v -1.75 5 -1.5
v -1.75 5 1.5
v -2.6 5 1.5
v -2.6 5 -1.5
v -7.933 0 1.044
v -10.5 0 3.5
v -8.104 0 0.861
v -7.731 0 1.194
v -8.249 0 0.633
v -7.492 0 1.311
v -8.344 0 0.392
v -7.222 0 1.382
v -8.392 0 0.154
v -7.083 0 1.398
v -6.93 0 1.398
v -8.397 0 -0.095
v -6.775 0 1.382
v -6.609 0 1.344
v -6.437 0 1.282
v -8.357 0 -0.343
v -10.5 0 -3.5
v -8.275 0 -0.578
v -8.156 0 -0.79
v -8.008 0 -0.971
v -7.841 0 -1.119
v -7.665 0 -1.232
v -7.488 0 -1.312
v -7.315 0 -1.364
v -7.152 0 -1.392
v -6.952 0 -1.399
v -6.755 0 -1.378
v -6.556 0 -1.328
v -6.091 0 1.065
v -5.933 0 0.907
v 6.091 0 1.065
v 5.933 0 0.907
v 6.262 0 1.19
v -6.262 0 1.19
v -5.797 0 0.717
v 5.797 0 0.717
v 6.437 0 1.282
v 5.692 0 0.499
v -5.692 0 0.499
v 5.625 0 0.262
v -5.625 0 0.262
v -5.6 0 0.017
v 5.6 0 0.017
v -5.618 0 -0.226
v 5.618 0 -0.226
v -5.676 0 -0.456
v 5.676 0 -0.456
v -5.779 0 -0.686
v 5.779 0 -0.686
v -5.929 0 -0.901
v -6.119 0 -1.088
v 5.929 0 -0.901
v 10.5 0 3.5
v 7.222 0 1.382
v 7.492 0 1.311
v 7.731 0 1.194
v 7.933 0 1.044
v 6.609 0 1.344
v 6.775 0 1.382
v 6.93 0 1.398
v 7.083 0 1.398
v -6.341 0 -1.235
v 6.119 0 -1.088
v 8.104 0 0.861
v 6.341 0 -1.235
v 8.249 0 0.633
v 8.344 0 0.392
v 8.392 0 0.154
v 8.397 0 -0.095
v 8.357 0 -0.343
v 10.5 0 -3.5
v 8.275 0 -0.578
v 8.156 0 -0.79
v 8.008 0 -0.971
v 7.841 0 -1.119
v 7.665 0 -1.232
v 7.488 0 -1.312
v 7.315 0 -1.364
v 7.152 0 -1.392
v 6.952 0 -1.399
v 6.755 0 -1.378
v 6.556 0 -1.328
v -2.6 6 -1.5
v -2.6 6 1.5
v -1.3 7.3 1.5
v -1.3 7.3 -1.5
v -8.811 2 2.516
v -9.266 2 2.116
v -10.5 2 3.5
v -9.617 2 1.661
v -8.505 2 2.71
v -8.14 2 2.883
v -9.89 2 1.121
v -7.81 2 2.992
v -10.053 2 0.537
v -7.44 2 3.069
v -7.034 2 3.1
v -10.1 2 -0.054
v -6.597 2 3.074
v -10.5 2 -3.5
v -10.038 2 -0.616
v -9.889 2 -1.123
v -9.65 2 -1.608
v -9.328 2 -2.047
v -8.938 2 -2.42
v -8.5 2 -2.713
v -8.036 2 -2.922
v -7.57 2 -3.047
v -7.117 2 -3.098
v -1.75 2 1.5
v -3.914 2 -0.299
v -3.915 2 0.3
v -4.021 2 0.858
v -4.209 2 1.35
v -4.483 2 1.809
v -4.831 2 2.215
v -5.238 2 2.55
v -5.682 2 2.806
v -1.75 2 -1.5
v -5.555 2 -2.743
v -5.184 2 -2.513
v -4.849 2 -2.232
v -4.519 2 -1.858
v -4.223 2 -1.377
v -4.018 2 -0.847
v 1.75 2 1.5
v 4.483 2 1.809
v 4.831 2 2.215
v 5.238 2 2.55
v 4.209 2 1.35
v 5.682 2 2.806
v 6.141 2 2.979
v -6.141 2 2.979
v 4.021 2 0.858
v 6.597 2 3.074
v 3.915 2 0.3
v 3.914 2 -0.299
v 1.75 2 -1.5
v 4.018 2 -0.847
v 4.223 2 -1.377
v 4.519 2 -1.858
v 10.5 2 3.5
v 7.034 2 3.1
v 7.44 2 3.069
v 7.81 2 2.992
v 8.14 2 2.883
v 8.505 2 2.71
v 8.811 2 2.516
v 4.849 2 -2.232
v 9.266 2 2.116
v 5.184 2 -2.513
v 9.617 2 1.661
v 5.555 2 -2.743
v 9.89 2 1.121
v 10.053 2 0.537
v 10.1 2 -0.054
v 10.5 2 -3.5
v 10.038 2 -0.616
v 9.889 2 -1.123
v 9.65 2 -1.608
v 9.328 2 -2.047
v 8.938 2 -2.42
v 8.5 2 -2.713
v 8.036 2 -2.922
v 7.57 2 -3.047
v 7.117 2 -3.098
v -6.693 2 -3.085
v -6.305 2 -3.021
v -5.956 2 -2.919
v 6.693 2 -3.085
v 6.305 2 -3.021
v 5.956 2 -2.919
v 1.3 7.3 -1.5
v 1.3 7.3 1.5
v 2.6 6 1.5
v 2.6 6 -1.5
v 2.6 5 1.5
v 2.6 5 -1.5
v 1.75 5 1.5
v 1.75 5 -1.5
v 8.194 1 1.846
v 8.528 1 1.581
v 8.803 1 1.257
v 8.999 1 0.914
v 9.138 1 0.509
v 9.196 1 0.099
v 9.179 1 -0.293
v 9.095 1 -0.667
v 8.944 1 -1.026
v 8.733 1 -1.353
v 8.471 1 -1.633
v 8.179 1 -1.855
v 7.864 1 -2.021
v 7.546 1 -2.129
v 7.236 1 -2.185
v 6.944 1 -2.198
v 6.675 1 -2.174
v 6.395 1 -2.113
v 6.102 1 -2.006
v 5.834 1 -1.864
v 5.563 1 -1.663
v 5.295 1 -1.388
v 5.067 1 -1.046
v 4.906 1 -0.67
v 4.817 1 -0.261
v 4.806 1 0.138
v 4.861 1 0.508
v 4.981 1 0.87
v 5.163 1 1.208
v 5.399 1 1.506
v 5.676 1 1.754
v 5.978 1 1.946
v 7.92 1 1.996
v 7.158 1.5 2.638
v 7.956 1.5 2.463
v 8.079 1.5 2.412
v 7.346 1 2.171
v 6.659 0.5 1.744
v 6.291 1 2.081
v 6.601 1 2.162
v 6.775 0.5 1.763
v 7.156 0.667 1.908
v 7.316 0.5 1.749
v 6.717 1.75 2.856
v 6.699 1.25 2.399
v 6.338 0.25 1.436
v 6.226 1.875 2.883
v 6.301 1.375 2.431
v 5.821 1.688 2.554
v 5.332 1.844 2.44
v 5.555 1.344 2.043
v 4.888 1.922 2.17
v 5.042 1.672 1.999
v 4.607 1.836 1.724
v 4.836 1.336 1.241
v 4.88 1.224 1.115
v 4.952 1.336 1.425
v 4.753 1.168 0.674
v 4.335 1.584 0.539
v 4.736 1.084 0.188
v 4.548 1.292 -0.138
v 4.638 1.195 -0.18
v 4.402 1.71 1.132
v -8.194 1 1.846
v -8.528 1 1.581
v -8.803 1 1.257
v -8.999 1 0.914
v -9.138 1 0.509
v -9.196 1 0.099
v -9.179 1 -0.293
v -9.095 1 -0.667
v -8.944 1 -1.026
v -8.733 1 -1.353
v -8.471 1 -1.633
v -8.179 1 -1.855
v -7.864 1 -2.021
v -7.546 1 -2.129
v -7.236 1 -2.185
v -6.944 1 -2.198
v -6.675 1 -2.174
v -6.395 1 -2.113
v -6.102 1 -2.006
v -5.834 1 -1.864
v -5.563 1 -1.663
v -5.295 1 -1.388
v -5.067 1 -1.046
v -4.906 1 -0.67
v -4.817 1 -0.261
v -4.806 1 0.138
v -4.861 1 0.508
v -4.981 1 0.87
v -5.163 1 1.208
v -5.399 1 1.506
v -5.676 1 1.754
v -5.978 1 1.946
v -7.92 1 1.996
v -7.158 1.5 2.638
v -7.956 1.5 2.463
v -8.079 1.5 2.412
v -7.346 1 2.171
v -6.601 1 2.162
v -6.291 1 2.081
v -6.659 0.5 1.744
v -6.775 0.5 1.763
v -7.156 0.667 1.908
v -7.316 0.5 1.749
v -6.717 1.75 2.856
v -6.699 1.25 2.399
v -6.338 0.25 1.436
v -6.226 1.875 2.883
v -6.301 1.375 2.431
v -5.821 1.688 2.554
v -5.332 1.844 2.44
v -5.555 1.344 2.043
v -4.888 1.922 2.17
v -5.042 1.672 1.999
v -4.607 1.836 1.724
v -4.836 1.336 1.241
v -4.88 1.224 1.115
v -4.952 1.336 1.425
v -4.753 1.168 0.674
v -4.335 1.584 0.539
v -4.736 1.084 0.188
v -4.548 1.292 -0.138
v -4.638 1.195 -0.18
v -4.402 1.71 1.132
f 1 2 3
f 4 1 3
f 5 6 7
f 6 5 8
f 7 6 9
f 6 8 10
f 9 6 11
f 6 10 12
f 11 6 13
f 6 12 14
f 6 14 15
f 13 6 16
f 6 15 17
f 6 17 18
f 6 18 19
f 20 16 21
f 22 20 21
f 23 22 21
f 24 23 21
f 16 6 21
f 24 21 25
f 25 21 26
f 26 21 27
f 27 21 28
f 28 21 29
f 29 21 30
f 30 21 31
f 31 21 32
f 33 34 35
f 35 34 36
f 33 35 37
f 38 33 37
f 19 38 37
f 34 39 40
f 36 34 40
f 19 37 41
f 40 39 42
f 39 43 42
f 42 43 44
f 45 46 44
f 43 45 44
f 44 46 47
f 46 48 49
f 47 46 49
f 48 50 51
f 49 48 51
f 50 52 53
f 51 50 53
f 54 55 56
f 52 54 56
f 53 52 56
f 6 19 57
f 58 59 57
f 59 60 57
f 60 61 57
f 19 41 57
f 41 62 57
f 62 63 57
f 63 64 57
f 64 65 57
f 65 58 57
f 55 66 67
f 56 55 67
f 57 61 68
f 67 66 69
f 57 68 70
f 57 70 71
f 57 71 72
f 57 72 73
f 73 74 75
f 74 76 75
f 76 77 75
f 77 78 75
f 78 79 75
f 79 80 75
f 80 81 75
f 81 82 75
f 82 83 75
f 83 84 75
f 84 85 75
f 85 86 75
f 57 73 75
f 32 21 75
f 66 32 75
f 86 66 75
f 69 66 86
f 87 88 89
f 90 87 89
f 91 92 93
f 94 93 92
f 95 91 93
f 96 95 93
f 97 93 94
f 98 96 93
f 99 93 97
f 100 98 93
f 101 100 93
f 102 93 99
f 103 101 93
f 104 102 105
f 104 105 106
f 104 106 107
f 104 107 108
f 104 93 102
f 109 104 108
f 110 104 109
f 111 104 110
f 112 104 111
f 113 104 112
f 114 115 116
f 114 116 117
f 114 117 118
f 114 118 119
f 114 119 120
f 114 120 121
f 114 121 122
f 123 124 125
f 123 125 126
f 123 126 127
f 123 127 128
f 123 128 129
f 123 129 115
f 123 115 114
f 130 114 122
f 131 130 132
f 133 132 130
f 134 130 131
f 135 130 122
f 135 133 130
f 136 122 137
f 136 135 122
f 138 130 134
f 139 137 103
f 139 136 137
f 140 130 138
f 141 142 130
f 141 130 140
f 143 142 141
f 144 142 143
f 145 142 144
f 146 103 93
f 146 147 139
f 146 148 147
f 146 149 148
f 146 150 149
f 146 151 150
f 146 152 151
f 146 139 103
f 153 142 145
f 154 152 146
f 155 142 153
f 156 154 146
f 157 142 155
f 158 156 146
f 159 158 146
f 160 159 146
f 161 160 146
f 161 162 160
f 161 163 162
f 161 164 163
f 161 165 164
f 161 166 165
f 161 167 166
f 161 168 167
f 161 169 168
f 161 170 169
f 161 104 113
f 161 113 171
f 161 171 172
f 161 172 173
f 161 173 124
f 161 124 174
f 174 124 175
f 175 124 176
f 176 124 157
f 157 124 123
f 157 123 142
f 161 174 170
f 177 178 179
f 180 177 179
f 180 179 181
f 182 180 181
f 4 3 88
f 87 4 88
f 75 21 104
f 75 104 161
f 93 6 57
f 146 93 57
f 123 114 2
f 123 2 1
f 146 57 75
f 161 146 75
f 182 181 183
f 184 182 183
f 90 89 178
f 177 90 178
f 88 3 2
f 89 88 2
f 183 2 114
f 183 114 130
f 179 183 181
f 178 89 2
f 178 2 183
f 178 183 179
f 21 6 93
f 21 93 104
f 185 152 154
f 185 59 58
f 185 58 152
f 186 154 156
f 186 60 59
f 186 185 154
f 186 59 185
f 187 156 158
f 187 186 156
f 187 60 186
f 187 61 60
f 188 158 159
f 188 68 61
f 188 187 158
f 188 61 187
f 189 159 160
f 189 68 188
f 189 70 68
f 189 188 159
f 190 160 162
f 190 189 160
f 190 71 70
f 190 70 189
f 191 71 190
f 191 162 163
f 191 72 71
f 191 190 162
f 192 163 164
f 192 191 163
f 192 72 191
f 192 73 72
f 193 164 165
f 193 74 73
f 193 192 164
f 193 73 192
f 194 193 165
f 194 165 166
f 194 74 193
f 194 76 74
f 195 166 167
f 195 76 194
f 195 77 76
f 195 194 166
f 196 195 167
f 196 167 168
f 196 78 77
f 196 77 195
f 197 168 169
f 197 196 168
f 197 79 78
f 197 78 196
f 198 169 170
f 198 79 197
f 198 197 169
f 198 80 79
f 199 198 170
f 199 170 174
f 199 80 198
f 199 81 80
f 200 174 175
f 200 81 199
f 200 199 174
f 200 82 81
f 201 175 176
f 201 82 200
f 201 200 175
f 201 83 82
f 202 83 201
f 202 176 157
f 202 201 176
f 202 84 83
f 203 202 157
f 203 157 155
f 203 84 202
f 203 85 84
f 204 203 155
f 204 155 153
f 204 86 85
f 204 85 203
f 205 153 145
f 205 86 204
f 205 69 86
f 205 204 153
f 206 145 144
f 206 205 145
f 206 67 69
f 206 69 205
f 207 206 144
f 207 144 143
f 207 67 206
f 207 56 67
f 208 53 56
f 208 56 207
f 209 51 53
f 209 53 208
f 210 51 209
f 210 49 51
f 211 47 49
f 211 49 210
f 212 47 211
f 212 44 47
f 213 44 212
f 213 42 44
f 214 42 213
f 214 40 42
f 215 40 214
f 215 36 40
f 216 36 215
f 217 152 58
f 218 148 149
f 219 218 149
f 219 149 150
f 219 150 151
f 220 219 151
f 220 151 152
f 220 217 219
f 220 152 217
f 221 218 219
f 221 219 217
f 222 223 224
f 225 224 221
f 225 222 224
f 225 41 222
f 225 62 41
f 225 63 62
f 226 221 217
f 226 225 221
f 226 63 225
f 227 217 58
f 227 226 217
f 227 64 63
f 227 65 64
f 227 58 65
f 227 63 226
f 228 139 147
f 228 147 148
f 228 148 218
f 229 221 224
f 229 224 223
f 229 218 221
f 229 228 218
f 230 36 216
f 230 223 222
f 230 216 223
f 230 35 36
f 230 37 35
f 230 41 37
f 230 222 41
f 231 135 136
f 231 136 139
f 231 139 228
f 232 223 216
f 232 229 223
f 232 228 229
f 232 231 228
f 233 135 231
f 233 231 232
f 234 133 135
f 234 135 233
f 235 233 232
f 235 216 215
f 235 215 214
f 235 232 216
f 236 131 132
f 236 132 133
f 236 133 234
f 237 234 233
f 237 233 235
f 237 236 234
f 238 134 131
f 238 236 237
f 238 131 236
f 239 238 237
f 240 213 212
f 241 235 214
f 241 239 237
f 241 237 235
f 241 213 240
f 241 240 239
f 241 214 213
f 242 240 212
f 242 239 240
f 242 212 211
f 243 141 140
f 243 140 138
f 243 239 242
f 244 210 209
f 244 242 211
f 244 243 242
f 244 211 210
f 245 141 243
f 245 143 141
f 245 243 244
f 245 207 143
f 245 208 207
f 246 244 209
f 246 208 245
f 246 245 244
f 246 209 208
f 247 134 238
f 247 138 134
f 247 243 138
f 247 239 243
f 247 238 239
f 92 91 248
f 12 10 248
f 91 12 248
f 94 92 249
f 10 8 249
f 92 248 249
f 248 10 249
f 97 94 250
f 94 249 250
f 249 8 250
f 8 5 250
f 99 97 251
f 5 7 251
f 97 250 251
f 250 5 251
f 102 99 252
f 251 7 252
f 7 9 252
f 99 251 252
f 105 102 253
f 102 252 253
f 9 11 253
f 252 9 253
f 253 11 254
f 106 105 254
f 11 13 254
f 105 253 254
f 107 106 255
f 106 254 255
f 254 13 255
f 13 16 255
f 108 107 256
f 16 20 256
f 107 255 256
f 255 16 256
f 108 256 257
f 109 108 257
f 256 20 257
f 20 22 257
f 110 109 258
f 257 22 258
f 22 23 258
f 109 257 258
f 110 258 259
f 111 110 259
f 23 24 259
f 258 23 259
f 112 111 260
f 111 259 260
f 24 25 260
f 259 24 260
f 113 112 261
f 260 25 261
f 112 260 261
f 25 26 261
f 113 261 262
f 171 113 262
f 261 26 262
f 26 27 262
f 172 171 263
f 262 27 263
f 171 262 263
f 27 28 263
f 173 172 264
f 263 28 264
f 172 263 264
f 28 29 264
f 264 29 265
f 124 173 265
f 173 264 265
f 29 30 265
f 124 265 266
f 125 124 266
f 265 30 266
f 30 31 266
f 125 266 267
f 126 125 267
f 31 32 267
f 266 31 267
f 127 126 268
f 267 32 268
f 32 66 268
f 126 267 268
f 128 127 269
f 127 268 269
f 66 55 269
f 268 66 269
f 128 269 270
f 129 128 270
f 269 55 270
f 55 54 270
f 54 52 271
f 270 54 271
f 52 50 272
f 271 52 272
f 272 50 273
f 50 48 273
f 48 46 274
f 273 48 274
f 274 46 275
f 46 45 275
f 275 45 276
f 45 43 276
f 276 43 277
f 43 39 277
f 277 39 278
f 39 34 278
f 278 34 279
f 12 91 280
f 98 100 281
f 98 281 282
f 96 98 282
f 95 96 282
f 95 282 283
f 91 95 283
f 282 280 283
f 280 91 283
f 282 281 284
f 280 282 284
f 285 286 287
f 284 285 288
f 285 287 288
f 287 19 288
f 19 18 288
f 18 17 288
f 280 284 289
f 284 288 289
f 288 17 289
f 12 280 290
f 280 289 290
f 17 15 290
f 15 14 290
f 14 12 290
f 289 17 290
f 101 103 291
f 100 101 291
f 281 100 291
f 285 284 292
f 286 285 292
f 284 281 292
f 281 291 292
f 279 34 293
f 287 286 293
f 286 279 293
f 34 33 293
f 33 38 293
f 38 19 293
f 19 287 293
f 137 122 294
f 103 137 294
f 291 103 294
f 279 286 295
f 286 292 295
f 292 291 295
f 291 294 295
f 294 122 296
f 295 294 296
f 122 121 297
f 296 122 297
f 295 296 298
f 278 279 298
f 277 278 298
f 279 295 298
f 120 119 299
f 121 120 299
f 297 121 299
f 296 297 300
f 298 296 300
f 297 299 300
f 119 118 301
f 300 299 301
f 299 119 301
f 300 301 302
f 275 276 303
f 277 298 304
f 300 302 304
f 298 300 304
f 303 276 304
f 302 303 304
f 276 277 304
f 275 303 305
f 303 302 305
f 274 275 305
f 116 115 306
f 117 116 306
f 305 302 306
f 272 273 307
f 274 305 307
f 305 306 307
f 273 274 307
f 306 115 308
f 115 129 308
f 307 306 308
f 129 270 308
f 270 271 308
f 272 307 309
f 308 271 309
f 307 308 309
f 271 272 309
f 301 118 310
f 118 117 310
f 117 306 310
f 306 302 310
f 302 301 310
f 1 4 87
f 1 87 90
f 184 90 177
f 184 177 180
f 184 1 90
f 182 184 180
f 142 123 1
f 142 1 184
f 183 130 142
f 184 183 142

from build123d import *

# Parameters (mm, degrees)
SKETCH1_W                       = 21
SKETCH1_H                       = 7
BOSS_EXTRUDE1_DEPTH             = 2
SKETCH4_W                       = 3.5
SKETCH4_H                       = 3
BOSS_EXTRUDE2_DEPTH             = 3
BOSS_EXTRUDE3_REACH             = 14.145
BOSS_EXTRUDE3_DIRECTION_2_REACH = 14.145


with BuildPart() as part:
    # Sketch1 → Boss-Extrude1 (new body)
    with BuildSketch(Plane(origin=(0, 0, 0), x_dir=(1, 0, 0), z_dir=(0, 1, 0))):
        Rectangle(SKETCH1_W, SKETCH1_H)
    extrude(amount=BOSS_EXTRUDE1_DEPTH)

    # Cut-Loft1: read off the stored shape, not the designer's step
    # Cut-Loft1: loft between two sections, ruled curve by curve
    cut_loft1_from = [
        Edge.make_bspline([(-8.811086142, 2, 2.515942564), (-13.842971271, 2, -1.106229719), (-10.220798987, 2, -6.138114848), (-5.188913858, 2, -2.515942564), (-0.157028729, 2, 1.106229719), (-3.779201013, 2, 6.138114848), (-8.811086142, 2, 2.515942564)], [0, 0, 0, 0, 0.5, 0.5, 0.5, 1, 1, 1, 1], 3, [1, 0.333333333, 0.333333333, 1, 0.333333333, 0.333333333, 1]),
    ]
    cut_loft1_to = [
        Edge.make_bspline([(-7.221614309, 0, 1.3823484), (-9.986311108, 0, 0.939119783), (-9.543082491, 0, -1.825577017), (-6.778385691, 0, -1.3823484), (-4.013688892, 0, -0.939119783), (-4.456917509, 0, 1.825577017), (-7.221614309, 0, 1.3823484)], [0, 0, 0, 0, 0.5, 0.5, 0.5, 1, 1, 1, 1], 3, [1, 0.333333333, 0.333333333, 1, 0.333333333, 0.333333333, 1]),
    ]
    cut_loft1 = Solid(Shell([*[Face.make_surface_from_curves(cut_loft1_from[k], cut_loft1_to[k]) for k in range(1)], Face(Wire(cut_loft1_from)), Face(Wire(cut_loft1_to))]))
    add(cut_loft1, mode=Mode.SUBTRACT)

    # Mirror1: Cut-Loft1 across plane
    add(cut_loft1.mirror(Plane(origin=(0, 0, 0), x_dir=(0, 0, 1), z_dir=(1, 0, 0))), mode=Mode.SUBTRACT)

    # Sketch4 → Boss-Extrude2 (add)
    with BuildSketch(Plane(origin=(0, 2, 0), x_dir=(1, 0, 0), z_dir=(0, 1, 0))):
        Rectangle(SKETCH4_W, SKETCH4_H)
    extrude(amount=BOSS_EXTRUDE2_DEPTH)

    # Boss-Extrude3: up to this face of the body (flat: up to its plane)
    boss_extrude3_end = Plane(part.part.faces().sort_by_distance((0, 3.5, 1.5))[0])
    # Sketch5 → Boss-Extrude3 (add, up to the picked face)
    with BuildSketch(Plane.XY, mode=Mode.PRIVATE) as boss_extrude3_sk1:
        Polygon((-2.6, 5), (-2.6, 6), (-1.3, 7.3), (1.3, 7.3), (2.6, 6), (2.6, 5), align=None)
    boss_extrude3_tool1 = split(extrude(boss_extrude3_sk1.sketch, amount=BOSS_EXTRUDE3_REACH, mode=Mode.PRIVATE), bisect_by=boss_extrude3_end, keep=Keep.BOTH, mode=Mode.PRIVATE)
    add(boss_extrude3_tool1.solids().sort_by(Axis((0, 6.032068, 0), (0, 0, 1)))[0])

    # Boss-Extrude3 direction 2: up to this face of the body (flat: up to its plane)
    boss_extrude3_direction_2_end = Plane(part.part.faces().sort_by_distance((0, 3.5, -1.5))[0])
    # Sketch5 → Boss-Extrude3 direction 2 (add, up to the picked face)
    with BuildSketch(Plane.XY, mode=Mode.PRIVATE) as boss_extrude3_direction_2_sk1:
        Polygon((-2.6, 5), (-2.6, 6), (-1.3, 7.3), (1.3, 7.3), (2.6, 6), (2.6, 5), align=None)
    boss_extrude3_direction_2_tool1 = split(extrude(boss_extrude3_direction_2_sk1.sketch, amount=-BOSS_EXTRUDE3_DIRECTION_2_REACH, mode=Mode.PRIVATE), bisect_by=boss_extrude3_direction_2_end, keep=Keep.BOTH, mode=Mode.PRIVATE)
    add(boss_extrude3_direction_2_tool1.solids().sort_by(Axis((0, 6.032068, 0), (0, 0, -1)))[0])


solid = part.part
